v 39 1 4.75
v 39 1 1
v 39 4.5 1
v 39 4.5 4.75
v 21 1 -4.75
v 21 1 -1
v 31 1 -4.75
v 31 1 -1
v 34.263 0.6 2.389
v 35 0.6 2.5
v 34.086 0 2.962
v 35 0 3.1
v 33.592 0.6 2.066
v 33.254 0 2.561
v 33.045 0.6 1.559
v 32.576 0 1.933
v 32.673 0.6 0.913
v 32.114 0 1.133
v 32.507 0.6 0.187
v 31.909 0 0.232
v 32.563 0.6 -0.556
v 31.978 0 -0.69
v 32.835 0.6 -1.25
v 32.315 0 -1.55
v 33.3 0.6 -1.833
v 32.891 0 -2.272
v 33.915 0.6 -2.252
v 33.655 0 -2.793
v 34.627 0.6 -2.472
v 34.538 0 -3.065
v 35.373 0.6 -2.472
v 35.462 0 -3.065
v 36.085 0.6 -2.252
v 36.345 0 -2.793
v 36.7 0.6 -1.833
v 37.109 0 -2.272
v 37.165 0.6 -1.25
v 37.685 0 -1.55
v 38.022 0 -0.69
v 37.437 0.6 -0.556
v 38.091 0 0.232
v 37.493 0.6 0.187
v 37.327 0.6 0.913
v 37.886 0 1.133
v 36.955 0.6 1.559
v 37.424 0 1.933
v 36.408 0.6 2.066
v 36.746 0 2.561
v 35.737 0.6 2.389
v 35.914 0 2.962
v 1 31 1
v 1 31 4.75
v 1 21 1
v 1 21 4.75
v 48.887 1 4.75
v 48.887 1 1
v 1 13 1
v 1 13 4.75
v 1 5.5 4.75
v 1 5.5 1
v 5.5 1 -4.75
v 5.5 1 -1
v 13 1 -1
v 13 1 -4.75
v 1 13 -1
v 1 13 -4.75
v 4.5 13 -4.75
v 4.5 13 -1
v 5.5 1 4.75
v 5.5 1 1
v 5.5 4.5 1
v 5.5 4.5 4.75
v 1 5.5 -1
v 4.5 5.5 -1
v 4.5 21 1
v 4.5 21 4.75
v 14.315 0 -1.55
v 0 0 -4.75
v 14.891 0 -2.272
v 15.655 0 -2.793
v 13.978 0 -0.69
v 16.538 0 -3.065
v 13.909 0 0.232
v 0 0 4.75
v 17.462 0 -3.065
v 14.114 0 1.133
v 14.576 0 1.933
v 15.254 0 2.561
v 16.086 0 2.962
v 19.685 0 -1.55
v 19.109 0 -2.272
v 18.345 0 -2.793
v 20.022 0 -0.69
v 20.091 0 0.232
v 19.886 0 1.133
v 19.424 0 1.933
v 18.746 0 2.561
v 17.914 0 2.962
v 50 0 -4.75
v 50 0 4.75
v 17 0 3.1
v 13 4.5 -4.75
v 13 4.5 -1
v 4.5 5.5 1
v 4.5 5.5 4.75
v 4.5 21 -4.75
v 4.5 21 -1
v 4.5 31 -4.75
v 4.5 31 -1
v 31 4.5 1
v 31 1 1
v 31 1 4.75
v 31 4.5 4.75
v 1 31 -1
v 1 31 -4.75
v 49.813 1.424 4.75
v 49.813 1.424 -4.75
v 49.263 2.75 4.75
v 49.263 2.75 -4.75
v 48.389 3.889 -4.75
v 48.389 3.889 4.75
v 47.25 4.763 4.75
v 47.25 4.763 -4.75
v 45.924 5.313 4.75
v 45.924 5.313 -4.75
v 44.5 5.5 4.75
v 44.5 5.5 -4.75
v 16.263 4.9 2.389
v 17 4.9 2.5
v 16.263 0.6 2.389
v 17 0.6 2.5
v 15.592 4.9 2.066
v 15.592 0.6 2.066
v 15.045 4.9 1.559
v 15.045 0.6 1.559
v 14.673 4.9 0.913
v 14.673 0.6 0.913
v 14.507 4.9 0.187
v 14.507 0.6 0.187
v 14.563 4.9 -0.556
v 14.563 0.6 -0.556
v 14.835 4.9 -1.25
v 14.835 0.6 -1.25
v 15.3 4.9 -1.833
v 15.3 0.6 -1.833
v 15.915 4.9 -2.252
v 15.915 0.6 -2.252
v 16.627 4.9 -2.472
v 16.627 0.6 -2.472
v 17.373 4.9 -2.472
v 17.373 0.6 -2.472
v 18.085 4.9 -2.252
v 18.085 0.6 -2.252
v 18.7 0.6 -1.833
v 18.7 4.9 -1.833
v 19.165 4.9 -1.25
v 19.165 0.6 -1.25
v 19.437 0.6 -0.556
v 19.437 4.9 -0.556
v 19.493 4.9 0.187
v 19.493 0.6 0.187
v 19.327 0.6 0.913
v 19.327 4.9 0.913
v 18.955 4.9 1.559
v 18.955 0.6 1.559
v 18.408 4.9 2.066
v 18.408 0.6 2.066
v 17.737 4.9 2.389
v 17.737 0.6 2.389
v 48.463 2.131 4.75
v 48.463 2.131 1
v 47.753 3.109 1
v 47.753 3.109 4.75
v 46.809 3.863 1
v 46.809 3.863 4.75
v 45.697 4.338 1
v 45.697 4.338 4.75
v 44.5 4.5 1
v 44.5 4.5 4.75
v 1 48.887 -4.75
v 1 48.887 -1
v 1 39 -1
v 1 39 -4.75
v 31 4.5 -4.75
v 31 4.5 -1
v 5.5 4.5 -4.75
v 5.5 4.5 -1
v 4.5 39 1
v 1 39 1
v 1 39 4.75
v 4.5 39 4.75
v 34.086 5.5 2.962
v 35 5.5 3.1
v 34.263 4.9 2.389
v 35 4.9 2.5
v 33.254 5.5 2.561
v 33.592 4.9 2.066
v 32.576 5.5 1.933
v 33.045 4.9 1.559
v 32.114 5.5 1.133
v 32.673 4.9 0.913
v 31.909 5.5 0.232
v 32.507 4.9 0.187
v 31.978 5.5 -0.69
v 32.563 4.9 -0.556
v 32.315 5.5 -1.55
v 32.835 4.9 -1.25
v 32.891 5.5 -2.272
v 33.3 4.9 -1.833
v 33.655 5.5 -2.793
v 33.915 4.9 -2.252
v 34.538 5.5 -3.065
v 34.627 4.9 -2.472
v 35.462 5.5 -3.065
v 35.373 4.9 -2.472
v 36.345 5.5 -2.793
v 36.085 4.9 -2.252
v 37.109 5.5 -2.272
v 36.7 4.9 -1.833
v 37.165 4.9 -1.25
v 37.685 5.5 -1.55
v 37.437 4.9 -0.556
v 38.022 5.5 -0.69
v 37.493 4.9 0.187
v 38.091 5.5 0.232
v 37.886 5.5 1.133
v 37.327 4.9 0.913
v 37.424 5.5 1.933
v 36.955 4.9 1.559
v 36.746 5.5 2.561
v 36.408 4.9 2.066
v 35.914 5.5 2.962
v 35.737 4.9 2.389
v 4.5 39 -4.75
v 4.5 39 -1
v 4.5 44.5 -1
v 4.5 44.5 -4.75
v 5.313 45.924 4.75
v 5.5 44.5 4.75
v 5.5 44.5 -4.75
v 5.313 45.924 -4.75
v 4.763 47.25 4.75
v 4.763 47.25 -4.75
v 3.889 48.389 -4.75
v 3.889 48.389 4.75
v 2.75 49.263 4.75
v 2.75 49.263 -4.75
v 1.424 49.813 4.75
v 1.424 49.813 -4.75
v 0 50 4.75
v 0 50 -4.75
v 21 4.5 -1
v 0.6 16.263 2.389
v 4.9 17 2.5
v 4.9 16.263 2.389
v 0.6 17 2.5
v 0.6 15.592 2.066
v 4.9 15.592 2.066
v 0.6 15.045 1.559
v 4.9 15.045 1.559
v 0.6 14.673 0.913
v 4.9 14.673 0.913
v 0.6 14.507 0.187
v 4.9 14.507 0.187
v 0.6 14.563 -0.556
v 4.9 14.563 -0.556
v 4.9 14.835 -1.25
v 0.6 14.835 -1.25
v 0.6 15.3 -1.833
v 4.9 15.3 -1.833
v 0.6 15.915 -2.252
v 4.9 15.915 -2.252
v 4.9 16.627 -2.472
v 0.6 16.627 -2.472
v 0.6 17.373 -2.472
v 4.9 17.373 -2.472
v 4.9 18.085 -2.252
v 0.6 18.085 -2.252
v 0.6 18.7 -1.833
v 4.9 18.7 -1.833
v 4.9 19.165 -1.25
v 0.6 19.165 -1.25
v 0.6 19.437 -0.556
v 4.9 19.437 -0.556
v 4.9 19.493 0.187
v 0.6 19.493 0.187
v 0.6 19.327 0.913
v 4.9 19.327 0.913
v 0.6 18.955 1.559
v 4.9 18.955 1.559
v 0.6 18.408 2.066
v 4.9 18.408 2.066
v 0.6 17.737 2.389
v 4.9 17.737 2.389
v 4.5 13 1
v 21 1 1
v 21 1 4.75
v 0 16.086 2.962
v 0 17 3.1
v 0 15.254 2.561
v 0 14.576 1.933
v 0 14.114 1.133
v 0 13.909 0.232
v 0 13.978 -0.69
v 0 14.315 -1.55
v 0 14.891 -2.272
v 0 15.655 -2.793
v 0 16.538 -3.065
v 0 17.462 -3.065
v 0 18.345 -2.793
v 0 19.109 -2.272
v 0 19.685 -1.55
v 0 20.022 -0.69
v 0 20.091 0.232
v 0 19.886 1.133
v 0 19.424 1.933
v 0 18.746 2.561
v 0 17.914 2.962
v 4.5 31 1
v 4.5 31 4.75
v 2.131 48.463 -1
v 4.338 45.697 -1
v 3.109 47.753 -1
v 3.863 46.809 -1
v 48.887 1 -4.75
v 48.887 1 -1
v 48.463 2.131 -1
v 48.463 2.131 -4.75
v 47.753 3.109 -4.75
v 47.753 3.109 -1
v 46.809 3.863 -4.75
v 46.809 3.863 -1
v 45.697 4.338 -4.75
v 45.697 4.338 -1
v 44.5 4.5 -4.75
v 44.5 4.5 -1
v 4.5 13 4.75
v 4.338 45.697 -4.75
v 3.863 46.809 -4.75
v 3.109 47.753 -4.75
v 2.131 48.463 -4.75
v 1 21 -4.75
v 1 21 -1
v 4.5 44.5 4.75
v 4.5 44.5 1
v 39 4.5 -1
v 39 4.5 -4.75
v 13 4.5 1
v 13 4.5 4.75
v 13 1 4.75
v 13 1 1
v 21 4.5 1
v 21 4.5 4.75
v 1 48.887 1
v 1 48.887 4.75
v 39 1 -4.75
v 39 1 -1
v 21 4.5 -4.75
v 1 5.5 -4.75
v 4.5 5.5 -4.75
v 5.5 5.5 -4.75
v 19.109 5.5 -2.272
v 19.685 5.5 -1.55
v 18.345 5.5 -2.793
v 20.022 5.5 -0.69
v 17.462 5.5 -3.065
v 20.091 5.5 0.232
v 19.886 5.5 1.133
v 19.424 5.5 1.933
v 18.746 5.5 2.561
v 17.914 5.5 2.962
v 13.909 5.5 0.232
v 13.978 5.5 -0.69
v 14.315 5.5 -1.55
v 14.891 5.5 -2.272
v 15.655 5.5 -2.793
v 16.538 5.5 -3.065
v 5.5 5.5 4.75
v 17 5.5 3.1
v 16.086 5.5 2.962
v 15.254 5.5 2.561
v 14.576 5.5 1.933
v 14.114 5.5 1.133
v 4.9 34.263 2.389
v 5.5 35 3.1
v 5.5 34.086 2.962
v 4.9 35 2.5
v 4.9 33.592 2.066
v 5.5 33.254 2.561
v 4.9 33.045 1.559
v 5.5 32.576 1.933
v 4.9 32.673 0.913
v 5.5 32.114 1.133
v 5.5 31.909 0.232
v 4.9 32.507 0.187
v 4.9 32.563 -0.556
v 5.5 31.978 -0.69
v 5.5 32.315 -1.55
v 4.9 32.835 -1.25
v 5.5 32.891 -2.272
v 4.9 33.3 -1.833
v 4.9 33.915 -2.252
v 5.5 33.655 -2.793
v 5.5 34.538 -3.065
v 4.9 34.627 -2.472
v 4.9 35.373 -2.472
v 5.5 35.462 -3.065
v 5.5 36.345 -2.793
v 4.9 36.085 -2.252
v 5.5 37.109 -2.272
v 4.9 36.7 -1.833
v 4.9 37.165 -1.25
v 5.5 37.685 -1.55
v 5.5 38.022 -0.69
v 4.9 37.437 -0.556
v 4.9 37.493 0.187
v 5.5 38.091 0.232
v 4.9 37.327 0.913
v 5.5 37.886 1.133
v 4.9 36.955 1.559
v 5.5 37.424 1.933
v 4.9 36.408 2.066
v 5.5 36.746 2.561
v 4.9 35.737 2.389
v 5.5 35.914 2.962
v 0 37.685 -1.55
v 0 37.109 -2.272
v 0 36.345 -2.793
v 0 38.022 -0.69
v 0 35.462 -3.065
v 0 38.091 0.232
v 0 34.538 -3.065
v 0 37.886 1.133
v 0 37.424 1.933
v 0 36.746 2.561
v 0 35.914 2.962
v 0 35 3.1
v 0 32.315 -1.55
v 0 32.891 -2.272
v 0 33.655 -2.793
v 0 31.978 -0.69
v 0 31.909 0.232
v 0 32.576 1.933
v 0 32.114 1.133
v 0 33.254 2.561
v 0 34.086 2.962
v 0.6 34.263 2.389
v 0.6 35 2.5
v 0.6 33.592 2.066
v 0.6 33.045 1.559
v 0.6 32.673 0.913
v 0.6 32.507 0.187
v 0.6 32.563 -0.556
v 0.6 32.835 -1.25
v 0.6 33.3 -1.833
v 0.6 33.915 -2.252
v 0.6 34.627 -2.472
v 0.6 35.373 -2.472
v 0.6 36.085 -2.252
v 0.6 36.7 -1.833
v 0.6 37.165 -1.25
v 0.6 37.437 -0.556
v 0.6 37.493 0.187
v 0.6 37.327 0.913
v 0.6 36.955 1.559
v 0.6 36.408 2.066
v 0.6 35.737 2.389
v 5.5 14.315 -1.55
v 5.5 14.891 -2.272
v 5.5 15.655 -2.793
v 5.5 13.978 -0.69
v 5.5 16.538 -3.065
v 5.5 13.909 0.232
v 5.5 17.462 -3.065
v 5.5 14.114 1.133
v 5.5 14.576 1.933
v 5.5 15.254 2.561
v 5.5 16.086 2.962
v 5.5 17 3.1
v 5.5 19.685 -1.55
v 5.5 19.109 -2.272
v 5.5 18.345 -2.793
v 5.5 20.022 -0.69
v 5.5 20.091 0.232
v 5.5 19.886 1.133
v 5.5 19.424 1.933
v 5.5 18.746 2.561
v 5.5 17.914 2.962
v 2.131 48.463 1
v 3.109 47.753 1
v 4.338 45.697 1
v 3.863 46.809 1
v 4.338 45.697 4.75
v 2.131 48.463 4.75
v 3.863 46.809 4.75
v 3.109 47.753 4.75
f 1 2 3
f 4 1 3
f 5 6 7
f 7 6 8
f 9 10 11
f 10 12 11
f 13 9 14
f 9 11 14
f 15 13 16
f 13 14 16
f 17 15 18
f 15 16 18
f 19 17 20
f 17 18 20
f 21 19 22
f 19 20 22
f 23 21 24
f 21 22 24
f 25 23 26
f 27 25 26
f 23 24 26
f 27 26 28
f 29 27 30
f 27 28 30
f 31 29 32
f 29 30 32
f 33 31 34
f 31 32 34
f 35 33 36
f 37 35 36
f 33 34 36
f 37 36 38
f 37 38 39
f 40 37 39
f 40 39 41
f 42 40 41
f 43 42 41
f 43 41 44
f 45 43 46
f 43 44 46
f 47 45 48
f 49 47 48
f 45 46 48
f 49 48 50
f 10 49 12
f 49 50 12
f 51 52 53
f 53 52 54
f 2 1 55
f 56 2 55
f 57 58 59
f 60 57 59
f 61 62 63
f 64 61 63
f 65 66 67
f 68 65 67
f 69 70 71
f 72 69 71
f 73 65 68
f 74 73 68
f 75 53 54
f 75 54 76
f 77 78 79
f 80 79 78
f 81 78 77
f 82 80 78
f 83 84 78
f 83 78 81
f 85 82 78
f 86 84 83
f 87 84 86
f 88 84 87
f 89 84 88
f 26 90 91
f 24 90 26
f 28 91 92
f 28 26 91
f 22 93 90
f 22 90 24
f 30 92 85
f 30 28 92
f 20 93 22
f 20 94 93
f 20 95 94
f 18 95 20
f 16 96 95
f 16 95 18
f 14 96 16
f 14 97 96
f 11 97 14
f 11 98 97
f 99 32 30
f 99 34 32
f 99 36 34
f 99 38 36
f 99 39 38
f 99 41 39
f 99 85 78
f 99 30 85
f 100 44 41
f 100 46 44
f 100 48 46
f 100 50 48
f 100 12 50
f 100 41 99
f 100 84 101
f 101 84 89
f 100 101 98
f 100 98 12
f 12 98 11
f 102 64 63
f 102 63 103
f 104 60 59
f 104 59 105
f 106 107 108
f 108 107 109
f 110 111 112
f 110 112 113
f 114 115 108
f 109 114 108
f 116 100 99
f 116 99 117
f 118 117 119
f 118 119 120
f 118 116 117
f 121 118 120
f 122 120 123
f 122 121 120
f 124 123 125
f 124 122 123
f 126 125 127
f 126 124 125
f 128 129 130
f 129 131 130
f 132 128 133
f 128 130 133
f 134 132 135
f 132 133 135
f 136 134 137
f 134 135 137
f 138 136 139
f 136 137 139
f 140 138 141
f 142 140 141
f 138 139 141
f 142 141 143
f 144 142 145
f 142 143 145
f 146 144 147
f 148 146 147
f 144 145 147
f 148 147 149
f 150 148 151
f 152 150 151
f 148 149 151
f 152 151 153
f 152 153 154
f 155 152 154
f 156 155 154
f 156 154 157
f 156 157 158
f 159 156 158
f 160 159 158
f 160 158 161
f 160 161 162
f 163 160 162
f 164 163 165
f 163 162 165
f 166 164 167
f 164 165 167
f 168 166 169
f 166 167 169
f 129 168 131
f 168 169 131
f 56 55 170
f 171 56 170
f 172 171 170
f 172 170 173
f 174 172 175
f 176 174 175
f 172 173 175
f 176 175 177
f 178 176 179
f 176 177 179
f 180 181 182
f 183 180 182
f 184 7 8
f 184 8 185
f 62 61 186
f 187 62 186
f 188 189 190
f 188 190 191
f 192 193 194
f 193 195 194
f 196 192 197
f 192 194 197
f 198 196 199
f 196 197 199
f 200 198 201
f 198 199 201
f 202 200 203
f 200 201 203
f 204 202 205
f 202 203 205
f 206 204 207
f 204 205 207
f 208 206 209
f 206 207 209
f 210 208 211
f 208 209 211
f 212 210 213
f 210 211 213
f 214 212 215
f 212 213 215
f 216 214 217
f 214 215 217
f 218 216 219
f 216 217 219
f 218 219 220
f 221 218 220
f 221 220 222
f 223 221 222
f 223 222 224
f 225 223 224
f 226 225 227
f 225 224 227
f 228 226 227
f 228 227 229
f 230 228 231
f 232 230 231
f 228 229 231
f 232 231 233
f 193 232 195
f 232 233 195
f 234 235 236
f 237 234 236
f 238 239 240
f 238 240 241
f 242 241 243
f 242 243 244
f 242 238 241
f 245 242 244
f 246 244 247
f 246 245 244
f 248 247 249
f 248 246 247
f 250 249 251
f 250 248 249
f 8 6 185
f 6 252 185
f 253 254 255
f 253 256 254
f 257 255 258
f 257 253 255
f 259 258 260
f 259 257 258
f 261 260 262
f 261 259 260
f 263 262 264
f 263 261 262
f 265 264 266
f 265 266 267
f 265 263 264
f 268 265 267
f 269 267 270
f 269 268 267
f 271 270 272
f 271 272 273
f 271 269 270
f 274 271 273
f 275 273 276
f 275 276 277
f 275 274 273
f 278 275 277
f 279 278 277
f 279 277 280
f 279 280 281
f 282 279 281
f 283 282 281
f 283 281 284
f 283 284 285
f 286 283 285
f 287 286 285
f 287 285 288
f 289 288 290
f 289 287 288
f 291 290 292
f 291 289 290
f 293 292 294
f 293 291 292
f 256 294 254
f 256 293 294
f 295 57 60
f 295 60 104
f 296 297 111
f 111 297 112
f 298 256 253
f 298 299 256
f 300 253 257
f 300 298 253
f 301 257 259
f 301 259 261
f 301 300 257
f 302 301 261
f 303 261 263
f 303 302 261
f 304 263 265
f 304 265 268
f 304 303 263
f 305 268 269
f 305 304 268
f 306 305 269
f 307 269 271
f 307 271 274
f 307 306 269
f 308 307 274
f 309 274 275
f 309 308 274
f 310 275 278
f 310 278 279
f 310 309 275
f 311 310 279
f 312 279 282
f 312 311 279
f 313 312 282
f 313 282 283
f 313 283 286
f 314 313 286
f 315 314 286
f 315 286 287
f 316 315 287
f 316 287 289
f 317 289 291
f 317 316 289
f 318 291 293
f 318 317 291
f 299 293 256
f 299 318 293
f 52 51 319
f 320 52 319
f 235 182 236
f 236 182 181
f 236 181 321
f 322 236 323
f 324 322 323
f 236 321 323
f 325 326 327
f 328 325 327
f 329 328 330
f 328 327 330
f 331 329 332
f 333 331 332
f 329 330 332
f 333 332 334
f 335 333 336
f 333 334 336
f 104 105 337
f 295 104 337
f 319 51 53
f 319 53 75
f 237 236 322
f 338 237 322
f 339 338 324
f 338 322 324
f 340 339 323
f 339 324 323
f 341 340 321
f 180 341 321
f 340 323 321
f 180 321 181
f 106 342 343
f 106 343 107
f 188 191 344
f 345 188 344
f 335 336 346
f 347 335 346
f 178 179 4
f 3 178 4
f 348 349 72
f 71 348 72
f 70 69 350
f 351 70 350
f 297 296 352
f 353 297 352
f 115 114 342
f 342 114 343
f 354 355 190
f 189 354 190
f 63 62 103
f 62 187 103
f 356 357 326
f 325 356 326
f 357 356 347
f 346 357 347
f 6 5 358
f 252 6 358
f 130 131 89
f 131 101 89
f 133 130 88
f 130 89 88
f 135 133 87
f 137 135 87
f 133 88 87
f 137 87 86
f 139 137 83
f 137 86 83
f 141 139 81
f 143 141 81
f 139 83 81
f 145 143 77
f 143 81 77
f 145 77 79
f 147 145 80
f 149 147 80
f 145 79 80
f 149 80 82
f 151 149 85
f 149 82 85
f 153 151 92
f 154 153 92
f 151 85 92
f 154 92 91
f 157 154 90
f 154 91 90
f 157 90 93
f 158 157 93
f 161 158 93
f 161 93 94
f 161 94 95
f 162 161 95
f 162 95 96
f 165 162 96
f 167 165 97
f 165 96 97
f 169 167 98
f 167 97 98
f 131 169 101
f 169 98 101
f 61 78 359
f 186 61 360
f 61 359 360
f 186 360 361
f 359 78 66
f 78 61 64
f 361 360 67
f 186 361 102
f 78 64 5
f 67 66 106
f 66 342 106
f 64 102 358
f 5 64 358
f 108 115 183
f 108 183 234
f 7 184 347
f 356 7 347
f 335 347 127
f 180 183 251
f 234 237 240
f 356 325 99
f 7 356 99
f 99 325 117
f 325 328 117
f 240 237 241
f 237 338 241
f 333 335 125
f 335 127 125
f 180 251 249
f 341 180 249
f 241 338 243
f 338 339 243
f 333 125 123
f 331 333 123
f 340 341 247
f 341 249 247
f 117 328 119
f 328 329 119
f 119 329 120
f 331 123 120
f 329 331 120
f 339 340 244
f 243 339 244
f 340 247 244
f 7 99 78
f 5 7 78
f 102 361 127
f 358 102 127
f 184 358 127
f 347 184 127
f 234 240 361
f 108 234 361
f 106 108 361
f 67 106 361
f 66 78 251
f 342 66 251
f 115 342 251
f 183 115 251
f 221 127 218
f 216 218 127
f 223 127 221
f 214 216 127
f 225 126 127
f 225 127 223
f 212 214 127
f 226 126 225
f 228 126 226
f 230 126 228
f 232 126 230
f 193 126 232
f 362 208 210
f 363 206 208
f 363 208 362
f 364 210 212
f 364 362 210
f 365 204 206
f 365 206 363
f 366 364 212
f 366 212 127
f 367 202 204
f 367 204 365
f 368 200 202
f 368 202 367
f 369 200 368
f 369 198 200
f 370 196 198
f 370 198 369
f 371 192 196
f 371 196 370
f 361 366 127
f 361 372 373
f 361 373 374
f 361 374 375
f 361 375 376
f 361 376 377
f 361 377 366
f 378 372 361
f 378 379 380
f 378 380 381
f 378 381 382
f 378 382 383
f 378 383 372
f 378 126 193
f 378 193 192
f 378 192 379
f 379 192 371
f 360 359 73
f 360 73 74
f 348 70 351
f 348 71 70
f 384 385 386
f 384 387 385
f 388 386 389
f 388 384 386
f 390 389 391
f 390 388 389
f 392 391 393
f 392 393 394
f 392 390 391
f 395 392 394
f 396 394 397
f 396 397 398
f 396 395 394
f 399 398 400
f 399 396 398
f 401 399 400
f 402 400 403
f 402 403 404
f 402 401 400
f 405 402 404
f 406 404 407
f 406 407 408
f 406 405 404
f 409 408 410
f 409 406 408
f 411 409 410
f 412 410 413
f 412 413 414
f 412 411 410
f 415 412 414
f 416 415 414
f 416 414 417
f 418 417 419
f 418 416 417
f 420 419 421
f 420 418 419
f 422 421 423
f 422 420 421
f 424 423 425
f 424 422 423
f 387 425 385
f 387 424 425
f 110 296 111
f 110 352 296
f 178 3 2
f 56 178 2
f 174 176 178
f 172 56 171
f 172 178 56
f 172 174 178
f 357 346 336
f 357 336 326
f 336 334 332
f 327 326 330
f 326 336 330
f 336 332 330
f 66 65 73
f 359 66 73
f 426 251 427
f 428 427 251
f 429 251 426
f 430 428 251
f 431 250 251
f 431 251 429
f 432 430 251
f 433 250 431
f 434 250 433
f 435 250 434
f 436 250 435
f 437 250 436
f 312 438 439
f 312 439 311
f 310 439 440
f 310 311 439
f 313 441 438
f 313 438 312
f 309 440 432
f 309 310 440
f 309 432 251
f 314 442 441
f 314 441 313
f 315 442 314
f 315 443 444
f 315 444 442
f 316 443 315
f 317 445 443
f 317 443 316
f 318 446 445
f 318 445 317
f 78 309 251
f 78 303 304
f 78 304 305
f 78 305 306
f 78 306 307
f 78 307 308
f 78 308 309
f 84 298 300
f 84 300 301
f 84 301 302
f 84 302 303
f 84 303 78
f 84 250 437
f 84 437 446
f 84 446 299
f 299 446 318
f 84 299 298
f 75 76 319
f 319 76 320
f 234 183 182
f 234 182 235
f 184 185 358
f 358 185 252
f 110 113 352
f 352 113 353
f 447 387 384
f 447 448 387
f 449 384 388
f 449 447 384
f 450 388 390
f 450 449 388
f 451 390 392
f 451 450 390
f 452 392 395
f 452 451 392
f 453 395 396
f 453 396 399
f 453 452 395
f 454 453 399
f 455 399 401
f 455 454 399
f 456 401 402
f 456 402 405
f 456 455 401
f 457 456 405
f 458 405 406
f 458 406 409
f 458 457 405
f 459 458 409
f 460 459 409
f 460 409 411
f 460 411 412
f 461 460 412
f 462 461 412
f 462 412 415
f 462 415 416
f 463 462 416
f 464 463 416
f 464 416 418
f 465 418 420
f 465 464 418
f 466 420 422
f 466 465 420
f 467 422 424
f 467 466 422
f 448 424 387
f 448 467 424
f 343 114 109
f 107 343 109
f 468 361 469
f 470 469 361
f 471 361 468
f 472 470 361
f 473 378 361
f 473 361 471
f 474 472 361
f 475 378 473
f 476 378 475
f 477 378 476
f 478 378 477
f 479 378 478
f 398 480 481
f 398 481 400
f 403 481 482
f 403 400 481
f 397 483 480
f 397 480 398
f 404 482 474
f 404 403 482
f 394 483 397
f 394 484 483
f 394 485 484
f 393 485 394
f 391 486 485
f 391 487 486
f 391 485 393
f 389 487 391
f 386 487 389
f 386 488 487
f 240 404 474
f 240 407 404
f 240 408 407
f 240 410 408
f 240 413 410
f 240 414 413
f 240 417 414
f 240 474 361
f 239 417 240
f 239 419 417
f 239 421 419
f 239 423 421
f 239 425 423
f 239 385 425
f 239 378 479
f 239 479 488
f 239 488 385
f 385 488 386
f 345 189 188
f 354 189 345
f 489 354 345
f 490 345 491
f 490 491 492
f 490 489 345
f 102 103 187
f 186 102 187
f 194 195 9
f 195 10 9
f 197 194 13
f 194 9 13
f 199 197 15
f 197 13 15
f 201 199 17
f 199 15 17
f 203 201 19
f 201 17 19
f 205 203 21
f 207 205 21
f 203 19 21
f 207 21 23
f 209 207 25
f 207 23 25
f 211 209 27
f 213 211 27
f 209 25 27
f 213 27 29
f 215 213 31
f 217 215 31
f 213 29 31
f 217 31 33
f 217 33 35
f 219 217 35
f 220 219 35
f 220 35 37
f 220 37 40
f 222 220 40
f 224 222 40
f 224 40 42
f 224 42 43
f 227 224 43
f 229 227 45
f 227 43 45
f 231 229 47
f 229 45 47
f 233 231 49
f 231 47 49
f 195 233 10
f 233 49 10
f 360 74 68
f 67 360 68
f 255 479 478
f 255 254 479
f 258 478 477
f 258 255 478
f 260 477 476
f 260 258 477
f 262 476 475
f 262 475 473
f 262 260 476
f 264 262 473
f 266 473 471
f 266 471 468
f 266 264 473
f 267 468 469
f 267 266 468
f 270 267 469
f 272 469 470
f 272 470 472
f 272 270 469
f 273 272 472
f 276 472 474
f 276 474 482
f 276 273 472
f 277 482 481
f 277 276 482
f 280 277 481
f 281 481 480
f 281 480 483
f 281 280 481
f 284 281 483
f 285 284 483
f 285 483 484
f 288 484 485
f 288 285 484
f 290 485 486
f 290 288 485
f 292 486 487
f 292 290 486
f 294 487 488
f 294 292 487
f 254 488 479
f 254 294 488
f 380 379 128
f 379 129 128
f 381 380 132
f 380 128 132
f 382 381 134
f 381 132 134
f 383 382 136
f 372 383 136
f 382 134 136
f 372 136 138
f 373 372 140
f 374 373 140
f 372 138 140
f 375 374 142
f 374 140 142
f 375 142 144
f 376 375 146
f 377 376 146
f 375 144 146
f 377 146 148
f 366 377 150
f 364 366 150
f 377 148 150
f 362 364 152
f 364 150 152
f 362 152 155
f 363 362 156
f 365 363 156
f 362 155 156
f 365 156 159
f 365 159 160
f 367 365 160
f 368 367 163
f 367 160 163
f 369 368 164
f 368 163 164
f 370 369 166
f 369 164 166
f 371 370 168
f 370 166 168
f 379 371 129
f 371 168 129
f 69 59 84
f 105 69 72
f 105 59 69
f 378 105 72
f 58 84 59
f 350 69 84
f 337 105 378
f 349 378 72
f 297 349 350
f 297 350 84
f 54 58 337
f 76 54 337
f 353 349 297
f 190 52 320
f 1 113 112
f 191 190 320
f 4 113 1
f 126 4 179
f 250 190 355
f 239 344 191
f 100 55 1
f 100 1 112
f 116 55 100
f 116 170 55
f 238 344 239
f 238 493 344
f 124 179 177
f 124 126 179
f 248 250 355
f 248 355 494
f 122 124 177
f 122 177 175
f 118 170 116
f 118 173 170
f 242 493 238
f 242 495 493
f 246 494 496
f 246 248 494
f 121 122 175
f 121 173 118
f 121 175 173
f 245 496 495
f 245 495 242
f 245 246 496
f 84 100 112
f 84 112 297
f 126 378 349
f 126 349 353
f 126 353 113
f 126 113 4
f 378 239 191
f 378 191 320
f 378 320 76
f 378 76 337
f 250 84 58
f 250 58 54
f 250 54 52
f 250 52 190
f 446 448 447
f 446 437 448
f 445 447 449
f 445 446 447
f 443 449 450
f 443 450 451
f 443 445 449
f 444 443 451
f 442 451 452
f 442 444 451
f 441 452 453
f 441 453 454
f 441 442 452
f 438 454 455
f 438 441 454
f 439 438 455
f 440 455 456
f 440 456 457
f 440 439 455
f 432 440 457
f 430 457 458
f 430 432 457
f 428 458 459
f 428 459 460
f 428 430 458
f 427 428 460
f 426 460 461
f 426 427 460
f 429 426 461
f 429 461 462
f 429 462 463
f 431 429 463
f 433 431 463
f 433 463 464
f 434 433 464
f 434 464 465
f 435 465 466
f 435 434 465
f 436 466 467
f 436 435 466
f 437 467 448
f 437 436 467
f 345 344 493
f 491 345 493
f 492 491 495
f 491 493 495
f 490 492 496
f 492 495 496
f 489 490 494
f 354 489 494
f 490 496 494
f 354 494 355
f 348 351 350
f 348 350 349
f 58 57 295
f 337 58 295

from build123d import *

# Parameters (mm, degrees)
EXTRUDE_1_DEPTH            = 4.75
EXTRUDE_START              = -4.75
SKETCH_2_W                 = 5.5
SKETCH_2_H                 = 5.5
SKETCH_2_H_2               = 8
SKETCH_2_W_2               = 8
EXTRUDE_2_DEPTH            = 9.5
EXTRUDE_3_DEPTH            = 1
HOLE_WIZARD_M61_AT_2_COUNT = 2
HOLE_WIZARD_M61_AT_2_PITCH = 18


with BuildPart() as part:
    # Эскиз1 → Бобышка-Вытянуть1 (new body, symmetric)
    with BuildSketch(Plane.XY):
        with BuildLine():
            Line((0, 50), (0, 0))
            Line((0, 0), (50, 0))
            ThreePointArc((50, 0), (48.389087297, 3.889087297), (44.5, 5.5))
            Line((44.5, 5.5), (5.5, 5.5))
            Line((5.5, 5.5), (5.5, 44.5))
            ThreePointArc((5.5, 44.5), (3.889087297, 48.389087297), (0, 50))
        make_face()
        with BuildLine():
            Line((1, 48.887482194), (1, 1))
            Line((1, 1), (48.887482194, 1))
            ThreePointArc((48.887482194, 1), (47.30624304, 3.51781182), (44.5, 4.5))
            Line((44.5, 4.5), (4.5, 4.5))
            Line((4.5, 4.5), (4.5, 44.5))
            ThreePointArc((4.5, 44.5), (3.51781182, 47.30624304), (1, 48.887482194))
        make_face(mode=Mode.SUBTRACT)
    extrude(amount=EXTRUDE_1_DEPTH, both=True)

    # Эскиз2 → Бобышка-Вытянуть2 (add)
    with BuildSketch(Plane.XY.offset(EXTRUDE_START)):
        with Locations((2.75, 2.75)):
            Rectangle(SKETCH_2_W, SKETCH_2_H)
        with Locations((2.75, 35)):
            Rectangle(SKETCH_2_W, SKETCH_2_H_2)
        with Locations((2.75, 17)):
            Rectangle(SKETCH_2_W, SKETCH_2_H_2)
        with Locations((17, 2.75)):
            Rectangle(SKETCH_2_W_2, SKETCH_2_H)
        with Locations((35, 2.75)):
            Rectangle(SKETCH_2_W_2, SKETCH_2_H)
    extrude(amount=EXTRUDE_2_DEPTH)

    # Эскиз3 → Бобышка-Вытянуть3 (add, symmetric)
    with BuildSketch(Plane.XY):
        with BuildLine():
            Line((0, 0), (50, 0))
            ThreePointArc((50, 0), (48.389087297, 3.889087297), (44.5, 5.5))
            Line((44.5, 5.5), (5.5, 5.5))
            Line((5.5, 5.5), (5.5, 44.5))
            ThreePointArc((5.5, 44.5), (3.889087297, 48.389087297), (0, 50))
            Line((0, 50), (0, 0))
        make_face()
    extrude(amount=EXTRUDE_3_DEPTH, both=True)

    # Эскиз5 → Отверстие обработанное метчиком M61 (revolve, cut)
    with BuildSketch(Plane.ZX.offset(35)):
        Polygon((0, 0), (0, 5.5), (3.1, 5.5), (2.5, 4.9), (2.5, 0.6), (3.1, 0), align=None)
    hole_wizard_m61 = revolve(axis=Axis((-6.35, 35, 0), (1, 0, 0)), mode=Mode.SUBTRACT)

    # Отверстие обработанное метчиком M61 at 2: Отверстие обработанное метчиком M61 ×2
    with Locations(*[(0, -i * HOLE_WIZARD_M61_AT_2_PITCH, 0) for i in range(1, HOLE_WIZARD_M61_AT_2_COUNT)]):
        add(hole_wizard_m61, mode=Mode.SUBTRACT)

    # Зеркальное отражение1: Отверстие обработанное метчиком M61 across plane
    add(hole_wizard_m61.mirror(Plane(origin=(0, 0, 0), x_dir=(0, 0, 1), z_dir=(-0.707106781, 0.707106781, 0))), mode=Mode.SUBTRACT)

    # Зеркальное отражение1 copy 1 sketch → Зеркальное отражение1 copy 1 (revolve, cut)
    with BuildSketch(Plane(origin=(17, 0, 0), x_dir=(0, 0, 1), z_dir=(1, 0, 0))):
        Polygon((0, 0), (0, -5.5), (3.1, -5.5), (2.5, -4.9), (2.5, -0.6), (3.1, 0), align=None)
    revolve(axis=Axis((17, -6.35, 0), (0, -1, 0)), mode=Mode.SUBTRACT)


solid = part.part
